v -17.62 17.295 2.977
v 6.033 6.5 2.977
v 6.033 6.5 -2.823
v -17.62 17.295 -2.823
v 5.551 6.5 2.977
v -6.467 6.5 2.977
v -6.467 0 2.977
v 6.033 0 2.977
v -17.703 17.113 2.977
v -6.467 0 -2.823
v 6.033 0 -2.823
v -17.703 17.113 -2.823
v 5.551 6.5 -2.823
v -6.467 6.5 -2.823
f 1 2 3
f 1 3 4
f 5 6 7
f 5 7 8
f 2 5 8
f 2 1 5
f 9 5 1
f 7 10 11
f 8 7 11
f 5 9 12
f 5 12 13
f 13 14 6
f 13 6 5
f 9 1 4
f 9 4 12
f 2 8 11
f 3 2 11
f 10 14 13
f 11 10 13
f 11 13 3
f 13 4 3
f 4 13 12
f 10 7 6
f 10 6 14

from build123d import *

# Parameters (mm, degrees)
SKETCH_1_W      = 12.5
SKETCH_1_H      = 5.8
EXTRUDE_1_DEPTH = 6.5
EXTRUDE_2_DEPTH = 5.8


with BuildPart() as part:
    # 草图1 → 凸台-拉伸1 (new body)
    with BuildSketch(Plane(origin=(0, 0, 0), x_dir=(1, 0, 0), z_dir=(0, 1, 0))):
        with Locations((-0.217181467, -0.076640927)):
            Rectangle(SKETCH_1_W, SKETCH_1_H)
    extrude(amount=EXTRUDE_1_DEPTH)

    # 草图2 → 凸台-拉伸2 (add, through all)
    with BuildSketch(Plane.XY.offset(2.976640927)):
        Polygon((6.032818533, 6.5), (-17.62035358, 17.294788047), (-17.703390412, 17.112840569), (5.551104582, 6.5), align=None)
    extrude(amount=-EXTRUDE_2_DEPTH)


solid = part.part
